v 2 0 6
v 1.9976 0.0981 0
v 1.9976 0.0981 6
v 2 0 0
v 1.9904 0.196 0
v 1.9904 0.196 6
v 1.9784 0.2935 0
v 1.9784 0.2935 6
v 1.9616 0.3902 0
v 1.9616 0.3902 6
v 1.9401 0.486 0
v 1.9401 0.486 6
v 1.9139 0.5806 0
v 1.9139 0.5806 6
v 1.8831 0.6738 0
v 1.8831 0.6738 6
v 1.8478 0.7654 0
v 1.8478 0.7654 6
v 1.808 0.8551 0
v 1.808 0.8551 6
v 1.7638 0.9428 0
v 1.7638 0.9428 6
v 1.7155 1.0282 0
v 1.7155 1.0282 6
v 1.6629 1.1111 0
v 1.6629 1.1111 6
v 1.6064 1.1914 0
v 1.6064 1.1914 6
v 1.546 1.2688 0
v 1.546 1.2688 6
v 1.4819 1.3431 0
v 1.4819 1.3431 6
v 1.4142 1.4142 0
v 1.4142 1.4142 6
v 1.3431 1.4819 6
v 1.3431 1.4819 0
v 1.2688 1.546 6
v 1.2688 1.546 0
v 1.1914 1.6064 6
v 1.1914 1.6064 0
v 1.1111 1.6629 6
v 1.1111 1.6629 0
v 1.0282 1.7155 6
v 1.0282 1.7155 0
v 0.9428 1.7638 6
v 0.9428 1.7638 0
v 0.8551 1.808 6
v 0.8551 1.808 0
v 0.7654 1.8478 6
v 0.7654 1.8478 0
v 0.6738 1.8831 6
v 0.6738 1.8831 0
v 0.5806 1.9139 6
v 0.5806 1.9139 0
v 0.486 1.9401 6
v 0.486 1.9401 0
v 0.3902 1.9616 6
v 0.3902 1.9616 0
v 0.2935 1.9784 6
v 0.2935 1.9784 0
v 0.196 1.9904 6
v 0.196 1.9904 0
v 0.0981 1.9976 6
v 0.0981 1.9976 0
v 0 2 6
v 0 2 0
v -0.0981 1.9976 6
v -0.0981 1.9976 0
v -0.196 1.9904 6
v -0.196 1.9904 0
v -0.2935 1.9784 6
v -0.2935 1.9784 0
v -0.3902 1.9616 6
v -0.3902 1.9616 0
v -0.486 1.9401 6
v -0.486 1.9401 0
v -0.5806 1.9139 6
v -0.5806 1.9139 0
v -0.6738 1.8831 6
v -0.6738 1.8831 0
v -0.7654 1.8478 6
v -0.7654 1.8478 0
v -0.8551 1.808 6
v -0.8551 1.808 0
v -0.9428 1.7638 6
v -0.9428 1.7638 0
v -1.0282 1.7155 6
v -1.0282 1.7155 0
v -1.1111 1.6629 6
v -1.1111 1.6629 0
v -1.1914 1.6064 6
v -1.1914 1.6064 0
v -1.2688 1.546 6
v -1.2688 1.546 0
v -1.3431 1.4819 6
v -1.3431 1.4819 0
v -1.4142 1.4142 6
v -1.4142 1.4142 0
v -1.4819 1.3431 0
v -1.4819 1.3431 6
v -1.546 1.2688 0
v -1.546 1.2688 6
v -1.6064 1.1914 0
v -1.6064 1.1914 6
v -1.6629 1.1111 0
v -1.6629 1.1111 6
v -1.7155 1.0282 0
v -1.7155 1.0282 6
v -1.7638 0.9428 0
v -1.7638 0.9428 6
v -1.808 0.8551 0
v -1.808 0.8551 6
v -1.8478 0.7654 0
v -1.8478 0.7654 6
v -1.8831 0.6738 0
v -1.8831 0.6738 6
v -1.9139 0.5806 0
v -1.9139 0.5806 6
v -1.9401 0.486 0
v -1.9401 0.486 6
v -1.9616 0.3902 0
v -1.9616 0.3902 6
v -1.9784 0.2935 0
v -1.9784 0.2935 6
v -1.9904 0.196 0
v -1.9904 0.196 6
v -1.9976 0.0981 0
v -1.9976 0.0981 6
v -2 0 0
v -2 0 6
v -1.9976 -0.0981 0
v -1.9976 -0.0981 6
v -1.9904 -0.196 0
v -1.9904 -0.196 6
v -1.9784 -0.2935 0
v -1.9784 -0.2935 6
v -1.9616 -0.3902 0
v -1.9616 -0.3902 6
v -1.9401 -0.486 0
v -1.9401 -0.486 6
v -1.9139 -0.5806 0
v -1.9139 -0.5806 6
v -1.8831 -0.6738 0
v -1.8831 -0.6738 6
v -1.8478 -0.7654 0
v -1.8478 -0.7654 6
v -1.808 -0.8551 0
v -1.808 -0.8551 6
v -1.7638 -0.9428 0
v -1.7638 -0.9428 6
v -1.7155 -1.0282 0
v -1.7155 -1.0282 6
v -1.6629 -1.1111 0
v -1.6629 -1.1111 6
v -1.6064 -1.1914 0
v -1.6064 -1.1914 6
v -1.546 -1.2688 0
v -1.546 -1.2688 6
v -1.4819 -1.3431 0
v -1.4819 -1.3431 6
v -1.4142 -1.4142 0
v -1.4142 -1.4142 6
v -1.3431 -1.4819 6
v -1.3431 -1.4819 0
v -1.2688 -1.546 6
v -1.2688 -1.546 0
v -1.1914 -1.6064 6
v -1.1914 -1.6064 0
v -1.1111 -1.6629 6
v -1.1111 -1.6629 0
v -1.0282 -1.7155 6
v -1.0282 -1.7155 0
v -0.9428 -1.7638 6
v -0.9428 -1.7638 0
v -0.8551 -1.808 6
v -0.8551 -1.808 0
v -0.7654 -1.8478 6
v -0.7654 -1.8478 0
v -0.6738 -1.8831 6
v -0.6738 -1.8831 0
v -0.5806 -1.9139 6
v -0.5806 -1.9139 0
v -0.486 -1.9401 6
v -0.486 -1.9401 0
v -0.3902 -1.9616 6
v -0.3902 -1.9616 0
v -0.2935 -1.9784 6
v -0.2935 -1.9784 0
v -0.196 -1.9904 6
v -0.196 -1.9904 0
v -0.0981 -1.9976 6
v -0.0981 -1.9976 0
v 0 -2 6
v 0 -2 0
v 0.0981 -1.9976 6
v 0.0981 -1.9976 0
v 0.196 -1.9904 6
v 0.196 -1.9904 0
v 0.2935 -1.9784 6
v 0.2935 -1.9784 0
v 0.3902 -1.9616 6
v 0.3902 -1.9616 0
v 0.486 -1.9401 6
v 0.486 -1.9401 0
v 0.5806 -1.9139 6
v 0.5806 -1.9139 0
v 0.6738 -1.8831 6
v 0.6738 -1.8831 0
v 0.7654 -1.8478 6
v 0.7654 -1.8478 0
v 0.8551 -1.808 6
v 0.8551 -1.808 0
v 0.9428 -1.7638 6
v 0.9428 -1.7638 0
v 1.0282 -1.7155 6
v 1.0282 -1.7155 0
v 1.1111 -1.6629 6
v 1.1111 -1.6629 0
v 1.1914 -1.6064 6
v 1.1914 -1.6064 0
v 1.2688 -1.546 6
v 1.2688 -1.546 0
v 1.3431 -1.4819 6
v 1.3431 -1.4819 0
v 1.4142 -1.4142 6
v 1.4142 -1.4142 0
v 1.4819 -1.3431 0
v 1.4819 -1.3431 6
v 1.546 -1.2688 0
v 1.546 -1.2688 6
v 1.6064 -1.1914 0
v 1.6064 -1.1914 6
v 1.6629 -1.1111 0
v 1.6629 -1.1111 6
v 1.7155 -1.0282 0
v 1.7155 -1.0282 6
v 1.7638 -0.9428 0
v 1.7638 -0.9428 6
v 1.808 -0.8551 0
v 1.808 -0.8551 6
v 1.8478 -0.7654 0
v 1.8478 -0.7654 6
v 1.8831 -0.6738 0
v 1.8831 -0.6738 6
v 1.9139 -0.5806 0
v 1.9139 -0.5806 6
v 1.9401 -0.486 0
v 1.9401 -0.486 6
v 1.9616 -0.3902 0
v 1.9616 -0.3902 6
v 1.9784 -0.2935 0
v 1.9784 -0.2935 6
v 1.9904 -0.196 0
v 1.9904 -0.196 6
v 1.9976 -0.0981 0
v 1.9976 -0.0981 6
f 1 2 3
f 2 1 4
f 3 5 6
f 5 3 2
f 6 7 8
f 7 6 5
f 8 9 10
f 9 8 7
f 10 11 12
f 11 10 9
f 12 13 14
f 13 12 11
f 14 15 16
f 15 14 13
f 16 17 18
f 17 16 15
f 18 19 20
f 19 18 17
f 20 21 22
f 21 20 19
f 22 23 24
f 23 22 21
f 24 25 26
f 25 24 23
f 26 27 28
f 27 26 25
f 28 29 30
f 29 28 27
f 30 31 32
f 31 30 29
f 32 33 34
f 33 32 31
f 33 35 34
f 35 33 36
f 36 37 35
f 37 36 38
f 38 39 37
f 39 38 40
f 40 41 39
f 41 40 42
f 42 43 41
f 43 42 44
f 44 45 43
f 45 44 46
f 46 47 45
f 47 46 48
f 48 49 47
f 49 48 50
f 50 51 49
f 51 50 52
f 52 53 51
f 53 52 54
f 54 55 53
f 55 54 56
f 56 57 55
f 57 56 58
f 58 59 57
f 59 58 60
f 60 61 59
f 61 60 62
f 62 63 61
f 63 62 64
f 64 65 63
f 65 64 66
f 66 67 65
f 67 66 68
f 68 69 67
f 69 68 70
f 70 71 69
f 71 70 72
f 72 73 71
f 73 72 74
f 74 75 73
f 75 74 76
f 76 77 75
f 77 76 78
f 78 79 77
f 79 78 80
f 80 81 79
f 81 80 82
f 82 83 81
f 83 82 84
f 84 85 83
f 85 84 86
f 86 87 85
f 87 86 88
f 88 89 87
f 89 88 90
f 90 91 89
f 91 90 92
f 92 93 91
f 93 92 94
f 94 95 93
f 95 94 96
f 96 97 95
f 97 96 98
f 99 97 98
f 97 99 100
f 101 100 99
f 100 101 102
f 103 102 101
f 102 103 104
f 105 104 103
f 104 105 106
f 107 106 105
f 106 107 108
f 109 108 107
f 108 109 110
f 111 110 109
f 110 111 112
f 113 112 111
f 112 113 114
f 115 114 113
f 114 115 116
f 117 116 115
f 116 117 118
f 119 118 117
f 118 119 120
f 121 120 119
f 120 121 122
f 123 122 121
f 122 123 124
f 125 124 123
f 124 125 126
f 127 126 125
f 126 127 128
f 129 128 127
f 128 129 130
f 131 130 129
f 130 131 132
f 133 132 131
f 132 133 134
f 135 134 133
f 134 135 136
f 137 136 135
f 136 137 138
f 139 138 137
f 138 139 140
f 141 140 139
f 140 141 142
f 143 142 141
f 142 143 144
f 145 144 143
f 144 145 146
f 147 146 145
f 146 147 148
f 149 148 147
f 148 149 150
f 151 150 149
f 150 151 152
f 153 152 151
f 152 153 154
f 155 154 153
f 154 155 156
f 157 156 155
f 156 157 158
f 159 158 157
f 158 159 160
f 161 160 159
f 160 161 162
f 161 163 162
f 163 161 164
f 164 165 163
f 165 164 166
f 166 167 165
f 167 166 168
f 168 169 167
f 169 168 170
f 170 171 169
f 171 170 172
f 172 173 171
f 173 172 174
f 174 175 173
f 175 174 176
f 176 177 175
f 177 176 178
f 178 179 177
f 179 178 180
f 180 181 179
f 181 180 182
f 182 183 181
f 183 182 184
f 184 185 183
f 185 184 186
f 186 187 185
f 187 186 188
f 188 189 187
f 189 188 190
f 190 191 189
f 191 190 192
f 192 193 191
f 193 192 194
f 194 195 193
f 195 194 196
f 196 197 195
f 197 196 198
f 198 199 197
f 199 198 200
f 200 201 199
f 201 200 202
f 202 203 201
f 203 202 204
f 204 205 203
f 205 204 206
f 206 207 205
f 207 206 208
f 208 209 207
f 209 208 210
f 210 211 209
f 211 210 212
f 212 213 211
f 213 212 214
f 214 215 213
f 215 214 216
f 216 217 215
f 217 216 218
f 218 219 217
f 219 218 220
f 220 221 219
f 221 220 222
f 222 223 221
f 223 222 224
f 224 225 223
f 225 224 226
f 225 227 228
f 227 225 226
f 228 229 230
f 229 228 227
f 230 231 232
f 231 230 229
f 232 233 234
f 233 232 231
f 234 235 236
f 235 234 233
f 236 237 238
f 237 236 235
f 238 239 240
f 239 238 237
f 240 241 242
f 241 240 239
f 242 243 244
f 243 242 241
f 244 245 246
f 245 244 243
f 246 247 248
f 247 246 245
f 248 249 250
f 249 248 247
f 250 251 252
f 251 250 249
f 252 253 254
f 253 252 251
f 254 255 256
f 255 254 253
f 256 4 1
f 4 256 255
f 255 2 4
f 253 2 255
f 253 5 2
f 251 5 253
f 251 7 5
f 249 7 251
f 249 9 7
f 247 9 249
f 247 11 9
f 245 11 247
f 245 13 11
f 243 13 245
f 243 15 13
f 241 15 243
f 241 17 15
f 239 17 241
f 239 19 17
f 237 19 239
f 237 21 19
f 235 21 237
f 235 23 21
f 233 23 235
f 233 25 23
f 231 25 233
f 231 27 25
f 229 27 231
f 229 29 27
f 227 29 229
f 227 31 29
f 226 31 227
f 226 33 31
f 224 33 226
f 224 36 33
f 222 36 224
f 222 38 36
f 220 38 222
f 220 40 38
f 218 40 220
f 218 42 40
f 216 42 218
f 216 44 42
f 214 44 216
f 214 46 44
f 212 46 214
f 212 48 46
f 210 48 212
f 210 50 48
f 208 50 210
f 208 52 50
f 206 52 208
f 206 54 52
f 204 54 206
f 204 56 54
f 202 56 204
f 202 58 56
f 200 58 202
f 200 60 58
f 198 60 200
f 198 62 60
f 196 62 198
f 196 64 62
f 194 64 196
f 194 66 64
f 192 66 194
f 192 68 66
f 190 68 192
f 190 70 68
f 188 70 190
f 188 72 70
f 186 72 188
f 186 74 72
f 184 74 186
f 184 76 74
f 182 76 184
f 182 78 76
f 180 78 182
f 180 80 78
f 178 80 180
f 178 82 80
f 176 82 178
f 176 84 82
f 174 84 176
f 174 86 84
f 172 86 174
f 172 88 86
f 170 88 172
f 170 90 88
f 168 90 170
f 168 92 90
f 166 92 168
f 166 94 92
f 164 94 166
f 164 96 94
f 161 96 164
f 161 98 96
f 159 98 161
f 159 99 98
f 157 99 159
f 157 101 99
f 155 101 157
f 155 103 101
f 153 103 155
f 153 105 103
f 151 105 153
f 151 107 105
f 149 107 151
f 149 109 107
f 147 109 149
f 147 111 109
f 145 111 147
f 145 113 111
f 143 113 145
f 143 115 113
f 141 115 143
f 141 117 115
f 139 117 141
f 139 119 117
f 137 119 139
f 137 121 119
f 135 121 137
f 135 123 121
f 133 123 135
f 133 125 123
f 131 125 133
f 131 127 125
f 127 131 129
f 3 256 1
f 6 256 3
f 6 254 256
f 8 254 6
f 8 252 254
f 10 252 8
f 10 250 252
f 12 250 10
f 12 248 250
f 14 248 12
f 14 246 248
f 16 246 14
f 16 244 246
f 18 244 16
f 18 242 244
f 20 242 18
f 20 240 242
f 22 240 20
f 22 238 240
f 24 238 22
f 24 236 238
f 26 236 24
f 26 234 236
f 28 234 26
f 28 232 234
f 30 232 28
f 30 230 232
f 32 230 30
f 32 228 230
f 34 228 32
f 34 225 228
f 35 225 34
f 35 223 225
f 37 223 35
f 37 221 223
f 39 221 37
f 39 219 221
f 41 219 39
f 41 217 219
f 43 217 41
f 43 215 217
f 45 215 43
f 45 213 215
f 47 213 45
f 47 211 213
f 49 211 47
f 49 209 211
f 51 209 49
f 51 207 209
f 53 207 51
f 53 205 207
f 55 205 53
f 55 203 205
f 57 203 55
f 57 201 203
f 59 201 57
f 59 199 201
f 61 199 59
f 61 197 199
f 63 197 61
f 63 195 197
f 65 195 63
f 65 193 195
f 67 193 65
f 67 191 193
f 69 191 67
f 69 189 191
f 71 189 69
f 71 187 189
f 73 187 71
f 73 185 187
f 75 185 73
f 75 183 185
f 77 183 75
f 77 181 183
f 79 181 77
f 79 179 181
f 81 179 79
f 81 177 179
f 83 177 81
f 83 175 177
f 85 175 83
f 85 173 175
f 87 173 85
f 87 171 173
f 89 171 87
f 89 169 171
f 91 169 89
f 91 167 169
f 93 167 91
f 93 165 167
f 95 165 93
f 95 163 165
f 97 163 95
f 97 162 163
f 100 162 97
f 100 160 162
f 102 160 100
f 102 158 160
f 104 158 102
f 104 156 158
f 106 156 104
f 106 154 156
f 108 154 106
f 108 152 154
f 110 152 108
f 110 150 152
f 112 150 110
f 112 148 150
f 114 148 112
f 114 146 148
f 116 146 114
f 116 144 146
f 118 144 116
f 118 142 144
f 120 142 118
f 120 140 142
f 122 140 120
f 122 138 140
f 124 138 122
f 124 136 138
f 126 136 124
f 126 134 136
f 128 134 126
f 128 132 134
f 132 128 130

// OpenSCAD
$fn = 128;

r = 2.0;
a = 0;
h = 6;

rotate([0,0,a])
cylinder(r=r, h=h, center=false);
